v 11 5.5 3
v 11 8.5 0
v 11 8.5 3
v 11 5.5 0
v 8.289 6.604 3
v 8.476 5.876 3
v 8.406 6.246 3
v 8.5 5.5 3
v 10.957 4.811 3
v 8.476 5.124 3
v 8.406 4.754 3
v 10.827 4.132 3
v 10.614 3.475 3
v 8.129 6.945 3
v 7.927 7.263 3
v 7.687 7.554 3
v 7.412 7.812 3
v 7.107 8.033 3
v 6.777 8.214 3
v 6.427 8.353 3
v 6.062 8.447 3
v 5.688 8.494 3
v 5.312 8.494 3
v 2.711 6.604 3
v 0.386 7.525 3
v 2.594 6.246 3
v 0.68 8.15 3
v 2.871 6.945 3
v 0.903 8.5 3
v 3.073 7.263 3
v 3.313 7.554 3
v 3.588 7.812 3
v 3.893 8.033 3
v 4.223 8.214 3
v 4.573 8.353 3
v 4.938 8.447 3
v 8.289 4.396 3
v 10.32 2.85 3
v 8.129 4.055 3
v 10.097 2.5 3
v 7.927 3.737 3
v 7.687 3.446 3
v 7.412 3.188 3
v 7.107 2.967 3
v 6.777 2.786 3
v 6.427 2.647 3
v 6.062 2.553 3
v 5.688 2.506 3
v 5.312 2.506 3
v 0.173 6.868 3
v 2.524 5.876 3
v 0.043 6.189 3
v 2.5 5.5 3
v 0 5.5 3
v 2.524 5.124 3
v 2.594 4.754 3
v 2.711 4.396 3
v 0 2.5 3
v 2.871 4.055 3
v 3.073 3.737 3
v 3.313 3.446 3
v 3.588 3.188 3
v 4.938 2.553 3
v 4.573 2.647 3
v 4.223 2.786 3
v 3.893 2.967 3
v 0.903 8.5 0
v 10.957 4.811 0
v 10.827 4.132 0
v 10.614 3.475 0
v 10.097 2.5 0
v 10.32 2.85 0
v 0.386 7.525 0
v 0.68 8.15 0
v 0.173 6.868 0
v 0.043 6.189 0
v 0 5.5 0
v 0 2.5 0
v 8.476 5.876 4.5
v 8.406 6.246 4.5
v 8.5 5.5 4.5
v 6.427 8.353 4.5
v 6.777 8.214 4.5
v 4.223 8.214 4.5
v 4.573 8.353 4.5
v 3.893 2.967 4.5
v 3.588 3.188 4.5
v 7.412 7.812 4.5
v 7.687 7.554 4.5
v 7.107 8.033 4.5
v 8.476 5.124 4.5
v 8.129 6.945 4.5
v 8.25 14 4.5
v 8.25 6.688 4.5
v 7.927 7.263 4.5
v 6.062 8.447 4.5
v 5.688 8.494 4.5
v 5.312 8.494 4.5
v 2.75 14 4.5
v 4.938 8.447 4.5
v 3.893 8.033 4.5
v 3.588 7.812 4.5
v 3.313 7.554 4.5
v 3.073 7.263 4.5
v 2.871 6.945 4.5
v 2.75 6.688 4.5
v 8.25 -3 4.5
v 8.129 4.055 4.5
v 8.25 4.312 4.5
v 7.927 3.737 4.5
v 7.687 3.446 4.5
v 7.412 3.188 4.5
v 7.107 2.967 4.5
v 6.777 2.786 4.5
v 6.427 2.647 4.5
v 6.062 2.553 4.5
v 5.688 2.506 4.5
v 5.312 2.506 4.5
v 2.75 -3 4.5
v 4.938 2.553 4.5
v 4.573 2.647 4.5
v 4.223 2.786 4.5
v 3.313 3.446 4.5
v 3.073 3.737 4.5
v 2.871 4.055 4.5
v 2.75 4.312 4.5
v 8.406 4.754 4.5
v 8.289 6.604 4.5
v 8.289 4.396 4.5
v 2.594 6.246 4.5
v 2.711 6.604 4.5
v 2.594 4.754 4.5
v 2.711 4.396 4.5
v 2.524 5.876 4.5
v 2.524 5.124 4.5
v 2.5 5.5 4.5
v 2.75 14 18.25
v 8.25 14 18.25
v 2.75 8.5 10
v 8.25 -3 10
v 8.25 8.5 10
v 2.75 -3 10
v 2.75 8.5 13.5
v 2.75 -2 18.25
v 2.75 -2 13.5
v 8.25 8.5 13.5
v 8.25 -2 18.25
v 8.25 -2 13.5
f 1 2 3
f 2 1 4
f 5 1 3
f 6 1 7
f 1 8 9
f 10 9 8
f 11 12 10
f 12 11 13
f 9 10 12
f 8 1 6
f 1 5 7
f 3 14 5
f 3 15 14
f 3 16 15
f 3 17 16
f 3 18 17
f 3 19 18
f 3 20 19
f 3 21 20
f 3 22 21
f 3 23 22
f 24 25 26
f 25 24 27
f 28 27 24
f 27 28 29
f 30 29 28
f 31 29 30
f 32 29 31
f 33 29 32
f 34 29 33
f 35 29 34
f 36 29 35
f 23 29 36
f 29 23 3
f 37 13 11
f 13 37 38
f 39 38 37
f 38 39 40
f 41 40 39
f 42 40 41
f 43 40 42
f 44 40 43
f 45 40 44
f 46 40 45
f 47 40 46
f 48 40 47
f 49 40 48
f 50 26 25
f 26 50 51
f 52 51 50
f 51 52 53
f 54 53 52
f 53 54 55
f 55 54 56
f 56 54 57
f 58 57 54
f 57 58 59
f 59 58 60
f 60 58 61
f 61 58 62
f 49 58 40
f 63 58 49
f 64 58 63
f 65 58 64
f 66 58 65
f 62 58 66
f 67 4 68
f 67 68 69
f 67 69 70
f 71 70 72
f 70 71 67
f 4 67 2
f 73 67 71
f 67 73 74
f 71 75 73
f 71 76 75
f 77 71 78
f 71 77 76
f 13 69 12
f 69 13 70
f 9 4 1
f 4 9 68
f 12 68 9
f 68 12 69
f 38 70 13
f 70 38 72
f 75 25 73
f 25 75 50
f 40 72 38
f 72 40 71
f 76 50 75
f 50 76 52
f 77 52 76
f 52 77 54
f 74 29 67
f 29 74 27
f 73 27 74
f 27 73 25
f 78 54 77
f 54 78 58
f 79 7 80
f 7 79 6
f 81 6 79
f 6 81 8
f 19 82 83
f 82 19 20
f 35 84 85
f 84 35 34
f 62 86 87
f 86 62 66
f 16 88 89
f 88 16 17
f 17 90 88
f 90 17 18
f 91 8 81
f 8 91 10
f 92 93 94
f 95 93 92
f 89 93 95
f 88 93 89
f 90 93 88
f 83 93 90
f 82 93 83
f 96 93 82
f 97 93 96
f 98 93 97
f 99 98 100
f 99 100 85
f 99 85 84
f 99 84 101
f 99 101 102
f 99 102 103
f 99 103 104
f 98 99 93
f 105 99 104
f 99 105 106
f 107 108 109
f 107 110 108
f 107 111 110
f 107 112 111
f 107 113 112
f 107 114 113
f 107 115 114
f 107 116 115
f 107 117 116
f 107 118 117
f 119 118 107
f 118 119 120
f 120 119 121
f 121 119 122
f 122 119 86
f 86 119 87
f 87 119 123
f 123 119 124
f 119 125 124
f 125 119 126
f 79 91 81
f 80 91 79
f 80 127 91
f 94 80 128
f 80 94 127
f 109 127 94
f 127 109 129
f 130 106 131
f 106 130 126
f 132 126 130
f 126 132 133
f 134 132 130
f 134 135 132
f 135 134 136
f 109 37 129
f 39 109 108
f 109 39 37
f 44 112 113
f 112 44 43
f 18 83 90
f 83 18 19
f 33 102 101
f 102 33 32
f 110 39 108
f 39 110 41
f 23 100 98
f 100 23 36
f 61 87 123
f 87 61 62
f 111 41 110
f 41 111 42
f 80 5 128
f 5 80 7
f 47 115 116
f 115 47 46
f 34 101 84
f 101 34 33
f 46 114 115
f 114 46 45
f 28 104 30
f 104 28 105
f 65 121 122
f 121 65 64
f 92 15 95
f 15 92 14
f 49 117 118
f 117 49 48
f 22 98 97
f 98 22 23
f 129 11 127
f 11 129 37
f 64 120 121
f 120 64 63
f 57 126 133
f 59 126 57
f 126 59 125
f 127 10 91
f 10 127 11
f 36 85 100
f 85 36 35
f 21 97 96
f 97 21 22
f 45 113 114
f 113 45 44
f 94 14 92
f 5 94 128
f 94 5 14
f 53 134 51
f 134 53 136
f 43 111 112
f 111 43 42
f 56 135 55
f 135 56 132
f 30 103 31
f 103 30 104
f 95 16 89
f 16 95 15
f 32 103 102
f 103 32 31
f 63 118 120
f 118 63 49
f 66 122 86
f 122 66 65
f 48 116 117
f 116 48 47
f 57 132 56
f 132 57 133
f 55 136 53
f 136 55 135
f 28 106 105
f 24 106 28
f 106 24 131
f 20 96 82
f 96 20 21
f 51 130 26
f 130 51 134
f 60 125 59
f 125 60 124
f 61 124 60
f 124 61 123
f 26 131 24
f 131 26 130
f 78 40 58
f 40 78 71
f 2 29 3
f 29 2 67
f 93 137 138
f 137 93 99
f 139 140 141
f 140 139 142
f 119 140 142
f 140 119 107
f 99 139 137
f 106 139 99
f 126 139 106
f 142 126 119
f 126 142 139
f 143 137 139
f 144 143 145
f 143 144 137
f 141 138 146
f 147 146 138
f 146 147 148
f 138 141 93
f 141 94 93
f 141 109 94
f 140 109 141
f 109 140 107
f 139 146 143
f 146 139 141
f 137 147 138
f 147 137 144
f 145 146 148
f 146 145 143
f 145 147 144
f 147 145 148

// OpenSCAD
channel_width =11;
channel_depth = 3;
slot_width = 6;
slot_depth = 1.5;
clip_diameter = 15;
clip_width = channel_width;
clip_standoff = 4;

top_width = 10;
top_depth = 2;

a = channel_width / 2;
b = slot_width / 2;
c = clip_diameter / 2;


module base() {
	difference() {
		union() {
			cube([a, a, channel_depth]);
			translate([a, a, 0]) {
				cube([a, a, channel_depth]);
				cylinder(channel_depth, a, a, $fn=50);
			}

			translate([a, a, channel_depth]) cylinder(slot_depth, b, b, $fn=50);
		}
		translate([-0.5, -b, -0.5]) cube([2 *a + 1, a, channel_depth + 1]);
		translate([-0.5, a + b, -0.5]) cube([2 *a + 1, a, channel_depth + 1]);
	}
}


module top() {
	translate([-(clip_diameter / 2 + 1), -clip_width / 4, 0]) difference() {
		union() {
			cube([clip_diameter + 2, a, clip_diameter / 10 + clip_standoff]);
			translate([c+4, 0, clip_diameter / 10 + clip_standoff]) cube([a, a, clip_diameter / 10 + clip_standoff]);
			translate([1, 0, clip_diameter / 3 + clip_standoff]) cube([clip_diameter + 1, a, clip_diameter / 20 + clip_standoff]);
		}
//		union() {
//			translate([c + 1, clip_width + 0.5, clip_diameter / 2 + clip_standoff]) rotate([90, 0 ,0]) cylinder(clip_width + 1, c, c, $fn = 50);
//			translate([clip_diameter / 6 + 1, -0.5, clip_diameter / 2 + clip_standoff]) cube([clip_diameter * 2/3, clip_width + 1, clip_diameter]);
//		}
	}
}

base();
translate([a, a, channel_depth + slot_depth]) rotate([0, 0, 90]) top();
